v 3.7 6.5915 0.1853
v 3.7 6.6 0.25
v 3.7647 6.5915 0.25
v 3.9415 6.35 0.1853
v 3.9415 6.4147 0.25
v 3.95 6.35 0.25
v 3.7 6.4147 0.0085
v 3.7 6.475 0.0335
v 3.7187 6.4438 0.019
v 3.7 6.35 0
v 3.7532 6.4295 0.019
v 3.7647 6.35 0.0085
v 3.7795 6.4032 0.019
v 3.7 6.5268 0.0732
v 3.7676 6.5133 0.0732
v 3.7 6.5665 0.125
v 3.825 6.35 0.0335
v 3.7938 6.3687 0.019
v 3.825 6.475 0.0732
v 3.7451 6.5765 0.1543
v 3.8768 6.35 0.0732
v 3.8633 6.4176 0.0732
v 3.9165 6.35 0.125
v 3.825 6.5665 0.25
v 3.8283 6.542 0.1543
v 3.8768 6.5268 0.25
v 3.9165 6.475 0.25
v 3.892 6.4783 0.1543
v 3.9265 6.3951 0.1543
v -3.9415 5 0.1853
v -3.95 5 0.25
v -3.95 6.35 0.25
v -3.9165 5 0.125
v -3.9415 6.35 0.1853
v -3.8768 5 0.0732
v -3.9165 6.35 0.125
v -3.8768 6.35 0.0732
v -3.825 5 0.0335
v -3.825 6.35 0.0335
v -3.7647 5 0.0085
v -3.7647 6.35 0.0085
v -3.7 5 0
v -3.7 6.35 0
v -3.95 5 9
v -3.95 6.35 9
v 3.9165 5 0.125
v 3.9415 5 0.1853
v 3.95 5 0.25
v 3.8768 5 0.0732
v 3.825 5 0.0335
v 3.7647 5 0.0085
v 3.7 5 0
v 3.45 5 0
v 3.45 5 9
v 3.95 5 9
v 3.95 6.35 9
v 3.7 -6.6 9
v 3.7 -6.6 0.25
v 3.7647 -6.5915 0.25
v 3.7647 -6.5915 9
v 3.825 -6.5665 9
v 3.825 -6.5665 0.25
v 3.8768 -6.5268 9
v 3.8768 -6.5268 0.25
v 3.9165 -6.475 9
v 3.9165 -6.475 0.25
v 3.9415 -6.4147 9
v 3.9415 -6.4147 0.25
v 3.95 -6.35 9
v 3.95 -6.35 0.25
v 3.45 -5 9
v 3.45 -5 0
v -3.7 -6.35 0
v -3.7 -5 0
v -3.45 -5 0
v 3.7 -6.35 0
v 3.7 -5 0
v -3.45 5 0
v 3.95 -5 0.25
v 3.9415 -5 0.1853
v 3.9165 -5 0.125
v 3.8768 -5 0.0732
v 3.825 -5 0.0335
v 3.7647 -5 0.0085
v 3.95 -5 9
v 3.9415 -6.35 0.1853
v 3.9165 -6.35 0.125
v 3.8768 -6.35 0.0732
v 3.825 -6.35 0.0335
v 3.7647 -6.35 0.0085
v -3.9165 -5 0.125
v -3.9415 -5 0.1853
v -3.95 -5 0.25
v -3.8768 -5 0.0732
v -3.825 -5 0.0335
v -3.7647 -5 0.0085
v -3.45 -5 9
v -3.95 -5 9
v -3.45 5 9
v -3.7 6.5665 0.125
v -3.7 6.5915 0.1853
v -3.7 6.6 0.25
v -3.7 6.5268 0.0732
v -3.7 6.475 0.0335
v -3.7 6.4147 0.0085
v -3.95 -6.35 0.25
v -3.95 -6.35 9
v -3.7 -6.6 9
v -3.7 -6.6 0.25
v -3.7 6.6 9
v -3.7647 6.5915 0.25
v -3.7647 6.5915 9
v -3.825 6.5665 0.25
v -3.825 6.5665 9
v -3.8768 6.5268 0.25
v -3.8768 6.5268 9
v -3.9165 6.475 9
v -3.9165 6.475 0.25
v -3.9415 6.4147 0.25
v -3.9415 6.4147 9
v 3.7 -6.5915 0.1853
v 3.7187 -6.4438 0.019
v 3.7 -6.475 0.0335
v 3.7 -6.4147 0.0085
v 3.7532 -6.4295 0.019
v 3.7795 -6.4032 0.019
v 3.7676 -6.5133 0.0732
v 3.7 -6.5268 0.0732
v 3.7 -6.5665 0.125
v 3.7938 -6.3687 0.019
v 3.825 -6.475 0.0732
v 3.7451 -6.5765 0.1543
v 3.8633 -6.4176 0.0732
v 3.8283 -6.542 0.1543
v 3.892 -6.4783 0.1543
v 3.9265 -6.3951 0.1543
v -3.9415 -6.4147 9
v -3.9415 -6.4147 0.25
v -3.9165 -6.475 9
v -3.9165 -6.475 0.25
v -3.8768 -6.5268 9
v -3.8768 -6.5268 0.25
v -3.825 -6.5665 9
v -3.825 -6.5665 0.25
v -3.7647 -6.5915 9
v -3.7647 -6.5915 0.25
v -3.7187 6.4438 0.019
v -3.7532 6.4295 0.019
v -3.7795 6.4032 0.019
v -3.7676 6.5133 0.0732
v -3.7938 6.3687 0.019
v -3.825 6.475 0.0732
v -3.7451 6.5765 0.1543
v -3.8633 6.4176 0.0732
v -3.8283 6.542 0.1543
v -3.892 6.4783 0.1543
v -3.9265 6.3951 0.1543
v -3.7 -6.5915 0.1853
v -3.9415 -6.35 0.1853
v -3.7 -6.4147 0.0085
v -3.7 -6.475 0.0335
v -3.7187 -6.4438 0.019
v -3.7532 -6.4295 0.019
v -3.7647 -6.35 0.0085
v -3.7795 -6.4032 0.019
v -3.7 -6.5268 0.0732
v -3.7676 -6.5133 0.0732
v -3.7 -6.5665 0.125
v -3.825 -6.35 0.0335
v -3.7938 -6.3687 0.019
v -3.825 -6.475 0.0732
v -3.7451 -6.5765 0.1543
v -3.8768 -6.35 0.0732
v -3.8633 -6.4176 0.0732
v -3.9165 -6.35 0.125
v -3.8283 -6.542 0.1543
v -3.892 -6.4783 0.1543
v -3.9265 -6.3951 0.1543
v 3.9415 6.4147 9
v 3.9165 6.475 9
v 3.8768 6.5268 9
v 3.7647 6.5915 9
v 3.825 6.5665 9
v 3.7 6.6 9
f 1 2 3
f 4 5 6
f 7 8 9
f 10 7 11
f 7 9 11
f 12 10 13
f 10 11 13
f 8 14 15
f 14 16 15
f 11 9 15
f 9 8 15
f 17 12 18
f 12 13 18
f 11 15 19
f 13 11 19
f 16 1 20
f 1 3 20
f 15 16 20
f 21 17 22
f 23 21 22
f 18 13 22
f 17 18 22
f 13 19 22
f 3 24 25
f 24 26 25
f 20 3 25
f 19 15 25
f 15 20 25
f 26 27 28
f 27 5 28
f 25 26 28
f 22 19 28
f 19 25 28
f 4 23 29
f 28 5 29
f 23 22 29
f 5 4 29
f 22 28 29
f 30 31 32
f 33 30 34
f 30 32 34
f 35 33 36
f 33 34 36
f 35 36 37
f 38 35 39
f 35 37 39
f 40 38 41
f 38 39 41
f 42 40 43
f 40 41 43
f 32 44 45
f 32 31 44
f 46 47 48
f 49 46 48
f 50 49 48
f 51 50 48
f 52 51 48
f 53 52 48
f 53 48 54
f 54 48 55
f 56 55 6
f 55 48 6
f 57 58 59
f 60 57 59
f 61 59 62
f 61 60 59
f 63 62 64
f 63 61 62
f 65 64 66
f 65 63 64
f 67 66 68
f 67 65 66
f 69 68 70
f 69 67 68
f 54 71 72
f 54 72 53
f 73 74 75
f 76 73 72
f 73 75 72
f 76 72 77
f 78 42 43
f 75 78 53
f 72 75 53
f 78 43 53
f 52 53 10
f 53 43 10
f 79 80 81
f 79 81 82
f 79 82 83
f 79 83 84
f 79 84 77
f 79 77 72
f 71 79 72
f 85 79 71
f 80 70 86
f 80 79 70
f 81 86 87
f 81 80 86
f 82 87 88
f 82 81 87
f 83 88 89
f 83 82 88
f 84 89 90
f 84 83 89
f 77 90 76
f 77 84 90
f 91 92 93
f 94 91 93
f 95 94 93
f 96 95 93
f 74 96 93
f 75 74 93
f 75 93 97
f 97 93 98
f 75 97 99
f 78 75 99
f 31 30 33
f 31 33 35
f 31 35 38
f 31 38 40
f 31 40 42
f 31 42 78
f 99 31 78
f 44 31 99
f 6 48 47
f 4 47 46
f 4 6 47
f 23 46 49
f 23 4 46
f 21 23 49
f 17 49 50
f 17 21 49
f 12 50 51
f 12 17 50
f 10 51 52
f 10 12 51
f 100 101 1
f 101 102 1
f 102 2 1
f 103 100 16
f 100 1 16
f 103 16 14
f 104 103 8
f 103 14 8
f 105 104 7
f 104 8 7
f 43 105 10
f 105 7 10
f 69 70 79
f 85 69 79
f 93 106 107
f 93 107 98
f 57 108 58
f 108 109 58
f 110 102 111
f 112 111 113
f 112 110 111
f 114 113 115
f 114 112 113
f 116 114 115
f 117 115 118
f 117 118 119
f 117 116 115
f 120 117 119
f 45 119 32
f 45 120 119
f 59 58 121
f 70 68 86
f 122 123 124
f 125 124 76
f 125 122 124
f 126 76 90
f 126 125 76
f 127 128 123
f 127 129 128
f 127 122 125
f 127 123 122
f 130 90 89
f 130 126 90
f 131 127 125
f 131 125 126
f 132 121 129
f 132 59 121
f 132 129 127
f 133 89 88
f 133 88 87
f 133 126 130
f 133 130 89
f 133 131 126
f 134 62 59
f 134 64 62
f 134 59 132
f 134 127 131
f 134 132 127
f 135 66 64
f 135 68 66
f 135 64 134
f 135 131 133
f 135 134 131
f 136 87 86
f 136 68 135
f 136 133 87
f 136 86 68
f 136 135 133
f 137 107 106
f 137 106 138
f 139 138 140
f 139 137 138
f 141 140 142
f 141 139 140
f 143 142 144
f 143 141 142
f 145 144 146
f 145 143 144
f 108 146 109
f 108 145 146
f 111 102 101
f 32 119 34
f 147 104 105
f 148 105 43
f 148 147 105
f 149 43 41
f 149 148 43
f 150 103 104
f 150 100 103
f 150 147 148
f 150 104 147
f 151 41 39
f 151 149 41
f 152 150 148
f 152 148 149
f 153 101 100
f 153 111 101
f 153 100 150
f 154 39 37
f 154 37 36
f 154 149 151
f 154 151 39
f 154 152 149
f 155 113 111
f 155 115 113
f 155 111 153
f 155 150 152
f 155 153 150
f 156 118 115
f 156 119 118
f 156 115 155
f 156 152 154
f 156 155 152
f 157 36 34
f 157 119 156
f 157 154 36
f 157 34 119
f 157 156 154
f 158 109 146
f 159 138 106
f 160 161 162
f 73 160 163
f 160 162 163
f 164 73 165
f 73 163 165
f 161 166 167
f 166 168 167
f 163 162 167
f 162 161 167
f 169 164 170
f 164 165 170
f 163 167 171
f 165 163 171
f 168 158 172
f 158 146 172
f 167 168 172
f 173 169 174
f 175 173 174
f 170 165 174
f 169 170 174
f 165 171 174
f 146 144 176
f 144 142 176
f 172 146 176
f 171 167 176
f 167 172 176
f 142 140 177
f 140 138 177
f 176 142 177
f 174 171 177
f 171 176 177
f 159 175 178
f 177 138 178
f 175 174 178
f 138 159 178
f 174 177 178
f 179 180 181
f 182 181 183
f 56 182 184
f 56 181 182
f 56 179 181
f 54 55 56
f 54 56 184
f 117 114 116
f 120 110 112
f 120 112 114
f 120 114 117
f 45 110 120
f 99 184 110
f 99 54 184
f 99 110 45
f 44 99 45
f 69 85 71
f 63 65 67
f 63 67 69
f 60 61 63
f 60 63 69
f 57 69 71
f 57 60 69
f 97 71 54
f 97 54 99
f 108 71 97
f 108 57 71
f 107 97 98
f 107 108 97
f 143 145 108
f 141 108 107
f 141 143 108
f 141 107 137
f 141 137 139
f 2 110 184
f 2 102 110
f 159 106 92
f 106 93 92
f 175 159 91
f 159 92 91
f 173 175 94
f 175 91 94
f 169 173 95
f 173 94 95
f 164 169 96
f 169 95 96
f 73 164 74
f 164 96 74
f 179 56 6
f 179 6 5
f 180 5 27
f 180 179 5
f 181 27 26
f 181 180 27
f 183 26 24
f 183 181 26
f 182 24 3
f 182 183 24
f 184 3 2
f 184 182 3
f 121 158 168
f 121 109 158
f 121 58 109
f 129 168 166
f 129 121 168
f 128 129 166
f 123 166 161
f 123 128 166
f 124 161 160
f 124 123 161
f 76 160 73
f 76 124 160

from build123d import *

# Parameters (mm, degrees)
SKETCH_W        = 7.9
SKETCH_H        = 13.2
PAD_DEPTH       = 9.5
SKETCH004_W     = 10
SKETCH004_H     = 9.5
POCKET_DEPTH    = 0.5
POCKET001_DEPTH = 0.5
FILLET001_R     = 0.25


with BuildPart() as part:
    # Sketch → Pad (new body)
    with BuildSketch(Plane.XY):
        Rectangle(SKETCH_W, SKETCH_H)
    extrude(amount=PAD_DEPTH)

    # Sketch004 → Pocket (cut)
    with BuildSketch(Plane.YZ.offset(3.95)):
        with Locations((0, 4.75)):
            Rectangle(SKETCH004_W, SKETCH004_H)
    pocket = extrude(amount=-POCKET_DEPTH, mode=Mode.SUBTRACT)

    # Mirrored: Pocket across YZ
    add(pocket.mirror(Plane.YZ), mode=Mode.SUBTRACT)

    # Sketch005 → Pocket001 (cut)
    with BuildSketch(Plane.XY.offset(9.5)):
        Polygon((-3.95, 6.6), (3.95, 6.6), (3.95, 5), (3.45, 5), (3.45, 0), (-3.45, 0), (-3.45, 5), (-3.95, 5), align=None)
    pocket001 = extrude(amount=-POCKET001_DEPTH, mode=Mode.SUBTRACT)

    # Mirrored001: Pocket001 across XZ
    add(pocket001.mirror(Plane.XZ), mode=Mode.SUBTRACT)

    # Fillet001
    fillet001_edges = [part.edges().sort_by_distance(p)[0] for p in [
        (3.95, -6.6, 4.5),
        (-3.95, -6.6, 4.5),
        (-3.95, 6.6, 4.5),
        (3.95, 6.6, 4.5),
        (0, 6.6, 0),
        (0, -6.6, 0),
        (3.95, -5.8, 0),
        (3.95, 5.8, 0),
        (-3.95, -5.8, 0),
        (-3.95, 5.8, 0),
    ]]
    fillet(fillet001_edges, radius=FILLET001_R)


solid = part.part
